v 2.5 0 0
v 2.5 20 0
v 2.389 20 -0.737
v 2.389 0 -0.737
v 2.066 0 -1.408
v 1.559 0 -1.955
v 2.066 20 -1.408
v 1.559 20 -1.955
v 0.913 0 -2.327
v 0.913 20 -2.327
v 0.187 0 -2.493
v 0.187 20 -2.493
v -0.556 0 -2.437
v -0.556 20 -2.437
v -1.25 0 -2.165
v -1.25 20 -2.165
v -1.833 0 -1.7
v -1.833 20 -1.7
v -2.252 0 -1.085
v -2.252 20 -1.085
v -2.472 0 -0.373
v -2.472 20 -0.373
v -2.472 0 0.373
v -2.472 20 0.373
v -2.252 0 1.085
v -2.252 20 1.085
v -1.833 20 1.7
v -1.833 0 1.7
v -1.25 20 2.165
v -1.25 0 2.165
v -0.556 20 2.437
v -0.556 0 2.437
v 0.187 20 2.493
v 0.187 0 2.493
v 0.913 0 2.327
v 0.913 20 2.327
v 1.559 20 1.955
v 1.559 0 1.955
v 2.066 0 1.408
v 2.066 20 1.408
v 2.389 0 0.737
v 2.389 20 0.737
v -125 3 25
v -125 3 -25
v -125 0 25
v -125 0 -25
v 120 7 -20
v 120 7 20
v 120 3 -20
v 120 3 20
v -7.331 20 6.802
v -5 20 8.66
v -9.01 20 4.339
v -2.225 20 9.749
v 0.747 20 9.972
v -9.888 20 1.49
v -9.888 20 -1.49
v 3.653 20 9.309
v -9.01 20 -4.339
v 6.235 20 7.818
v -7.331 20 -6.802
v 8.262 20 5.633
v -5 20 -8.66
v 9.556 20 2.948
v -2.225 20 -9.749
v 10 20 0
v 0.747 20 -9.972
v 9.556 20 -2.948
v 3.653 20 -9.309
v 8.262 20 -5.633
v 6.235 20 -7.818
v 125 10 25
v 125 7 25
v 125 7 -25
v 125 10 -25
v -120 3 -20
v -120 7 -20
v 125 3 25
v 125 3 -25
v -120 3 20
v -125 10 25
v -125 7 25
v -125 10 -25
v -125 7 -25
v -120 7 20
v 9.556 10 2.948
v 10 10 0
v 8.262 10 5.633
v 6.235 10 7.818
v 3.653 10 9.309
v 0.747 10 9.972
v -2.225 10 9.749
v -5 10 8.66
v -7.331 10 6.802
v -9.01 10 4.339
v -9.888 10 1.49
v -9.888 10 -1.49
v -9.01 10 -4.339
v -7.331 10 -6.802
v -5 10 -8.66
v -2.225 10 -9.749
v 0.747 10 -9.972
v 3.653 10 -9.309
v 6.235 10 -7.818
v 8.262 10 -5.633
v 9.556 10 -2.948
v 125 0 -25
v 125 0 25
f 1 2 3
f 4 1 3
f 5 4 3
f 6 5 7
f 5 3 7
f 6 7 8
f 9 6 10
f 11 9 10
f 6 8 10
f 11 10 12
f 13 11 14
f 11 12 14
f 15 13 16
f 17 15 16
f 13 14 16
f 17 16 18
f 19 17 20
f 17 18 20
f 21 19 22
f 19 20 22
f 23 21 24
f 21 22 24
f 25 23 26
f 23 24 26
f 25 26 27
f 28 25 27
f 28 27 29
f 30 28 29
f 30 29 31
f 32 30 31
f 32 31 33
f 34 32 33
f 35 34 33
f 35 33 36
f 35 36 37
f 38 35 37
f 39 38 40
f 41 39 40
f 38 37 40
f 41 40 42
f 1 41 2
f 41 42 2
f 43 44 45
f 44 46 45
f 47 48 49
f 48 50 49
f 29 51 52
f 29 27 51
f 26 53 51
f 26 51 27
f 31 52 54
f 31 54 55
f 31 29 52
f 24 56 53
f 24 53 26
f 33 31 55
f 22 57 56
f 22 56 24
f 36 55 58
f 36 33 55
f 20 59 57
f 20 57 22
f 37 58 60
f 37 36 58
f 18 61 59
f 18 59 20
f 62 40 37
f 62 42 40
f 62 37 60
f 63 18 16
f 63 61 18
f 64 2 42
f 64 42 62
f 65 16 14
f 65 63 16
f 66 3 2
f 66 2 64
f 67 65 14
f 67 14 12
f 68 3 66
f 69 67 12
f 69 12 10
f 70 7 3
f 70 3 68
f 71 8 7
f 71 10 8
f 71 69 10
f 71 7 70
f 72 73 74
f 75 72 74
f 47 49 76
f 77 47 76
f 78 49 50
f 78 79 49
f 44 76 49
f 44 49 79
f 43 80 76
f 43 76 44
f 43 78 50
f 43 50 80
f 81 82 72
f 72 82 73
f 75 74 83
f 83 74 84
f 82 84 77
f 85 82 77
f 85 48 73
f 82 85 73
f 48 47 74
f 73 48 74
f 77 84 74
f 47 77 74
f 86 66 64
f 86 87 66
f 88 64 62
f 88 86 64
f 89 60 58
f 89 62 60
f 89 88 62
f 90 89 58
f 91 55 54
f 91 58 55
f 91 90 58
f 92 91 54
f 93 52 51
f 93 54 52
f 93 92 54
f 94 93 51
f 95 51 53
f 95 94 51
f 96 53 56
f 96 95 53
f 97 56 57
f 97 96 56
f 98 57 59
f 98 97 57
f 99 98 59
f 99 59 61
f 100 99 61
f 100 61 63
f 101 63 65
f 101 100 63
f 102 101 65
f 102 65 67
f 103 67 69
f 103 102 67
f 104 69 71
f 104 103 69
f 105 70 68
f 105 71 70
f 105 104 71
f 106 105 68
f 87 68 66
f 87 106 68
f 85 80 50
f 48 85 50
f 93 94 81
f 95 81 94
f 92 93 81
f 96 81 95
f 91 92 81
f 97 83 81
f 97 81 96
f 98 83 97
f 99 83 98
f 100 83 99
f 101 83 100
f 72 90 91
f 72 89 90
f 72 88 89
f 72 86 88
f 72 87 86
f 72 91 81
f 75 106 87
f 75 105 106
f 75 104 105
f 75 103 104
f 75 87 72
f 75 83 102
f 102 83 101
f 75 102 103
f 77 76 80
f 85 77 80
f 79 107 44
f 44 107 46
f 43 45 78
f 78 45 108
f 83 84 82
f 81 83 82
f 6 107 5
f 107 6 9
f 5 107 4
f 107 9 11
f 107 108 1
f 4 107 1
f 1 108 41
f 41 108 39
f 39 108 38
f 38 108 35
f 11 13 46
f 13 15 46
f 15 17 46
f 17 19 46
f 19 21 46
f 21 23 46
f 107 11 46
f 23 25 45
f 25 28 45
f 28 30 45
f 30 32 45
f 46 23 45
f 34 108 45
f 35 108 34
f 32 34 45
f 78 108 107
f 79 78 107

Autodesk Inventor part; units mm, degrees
ref_plane "YZ Plane" through (0, 0, 0) normal (1, 0, 0) x (0, 1, 0)
ref_plane "XZ Plane" through (0, 0, 0) normal (0, 1, 0) x (-1, 0, 0)
ref_plane "XY Plane" through (0, 0, 0) normal (0, 0, 1) x (1, 0, 0)
sketch "Sketch1" plane through (0, 0, 0) normal (0, 1, 0) x (-1, 0, 0)
  line L0 (-125, -25) -> (125, -25)
  line L1 (125, -25) -> (125, 25)
  line L2 (125, 25) -> (-125, 25)
  line L3 (-125, 25) -> (-125, -25)
  line L4 (-125, -25) -> (125, 25) construction
  line L5 (125, -25) -> (-125, 25) construction
  point P0 (0, 0)
  dimension "d0" = 250
  dimension "d1" = 50
extrude "Extrusion1" add sketch "Sketch1" along normal blind 3
sketch "Sketch2" plane through (0, 3, 0) normal (0, 1, 0) x (1, 0, 0)
  line L0 (120, 20) -> (-120, 20)
  line L1 (-120, 20) -> (-120, -20)
  line L2 (-120, -20) -> (120, -20)
  line L3 (120, -20) -> (120, 20)
  line L4 (120, 20) -> (-120, -20) construction
  line L5 (-120, 20) -> (120, -20) construction
  point P0 (0, 0)
  dimension "d4" = 240
  dimension "d5" = 40
extrude "Extrusion2" add sketch "Sketch2" along normal blind 4
sketch "Sketch3" plane through (0, 7, 0) normal (0, 1, 0) x (1, 0, 0)
  line L0 (125, 25) -> (-125, 25)
  line L1 (-125, 25) -> (-125, -25)
  line L2 (-125, -25) -> (125, -25)
  line L3 (125, -25) -> (125, 25)
  line L4 (125, 25) -> (-125, -25) construction
  line L5 (-125, 25) -> (125, -25) construction
  point P0 (0, 0)
extrude "Extrusion3" add sketch "Sketch3" along normal blind 3
sketch "Sketch4" plane through (0, 10, 0) normal (0, 1, 0) x (1, 0, 0)
  circle A0 centre (0, 0) radius 10
  dimension "d10" = 20
extrude "Extrusion4" add sketch "Sketch4" along normal blind 10
sketch "Sketch5" plane through (0, 20, 0) normal (0, 1, 0) x (1, 0, 0)
  circle A0 centre (0, 0) radius 2.5
  dimension "d13" = 5
extrude "Extrusion5" cut sketch "Sketch5" against normal blind 30
properties part number "trail 7" material "Polypropylene"
